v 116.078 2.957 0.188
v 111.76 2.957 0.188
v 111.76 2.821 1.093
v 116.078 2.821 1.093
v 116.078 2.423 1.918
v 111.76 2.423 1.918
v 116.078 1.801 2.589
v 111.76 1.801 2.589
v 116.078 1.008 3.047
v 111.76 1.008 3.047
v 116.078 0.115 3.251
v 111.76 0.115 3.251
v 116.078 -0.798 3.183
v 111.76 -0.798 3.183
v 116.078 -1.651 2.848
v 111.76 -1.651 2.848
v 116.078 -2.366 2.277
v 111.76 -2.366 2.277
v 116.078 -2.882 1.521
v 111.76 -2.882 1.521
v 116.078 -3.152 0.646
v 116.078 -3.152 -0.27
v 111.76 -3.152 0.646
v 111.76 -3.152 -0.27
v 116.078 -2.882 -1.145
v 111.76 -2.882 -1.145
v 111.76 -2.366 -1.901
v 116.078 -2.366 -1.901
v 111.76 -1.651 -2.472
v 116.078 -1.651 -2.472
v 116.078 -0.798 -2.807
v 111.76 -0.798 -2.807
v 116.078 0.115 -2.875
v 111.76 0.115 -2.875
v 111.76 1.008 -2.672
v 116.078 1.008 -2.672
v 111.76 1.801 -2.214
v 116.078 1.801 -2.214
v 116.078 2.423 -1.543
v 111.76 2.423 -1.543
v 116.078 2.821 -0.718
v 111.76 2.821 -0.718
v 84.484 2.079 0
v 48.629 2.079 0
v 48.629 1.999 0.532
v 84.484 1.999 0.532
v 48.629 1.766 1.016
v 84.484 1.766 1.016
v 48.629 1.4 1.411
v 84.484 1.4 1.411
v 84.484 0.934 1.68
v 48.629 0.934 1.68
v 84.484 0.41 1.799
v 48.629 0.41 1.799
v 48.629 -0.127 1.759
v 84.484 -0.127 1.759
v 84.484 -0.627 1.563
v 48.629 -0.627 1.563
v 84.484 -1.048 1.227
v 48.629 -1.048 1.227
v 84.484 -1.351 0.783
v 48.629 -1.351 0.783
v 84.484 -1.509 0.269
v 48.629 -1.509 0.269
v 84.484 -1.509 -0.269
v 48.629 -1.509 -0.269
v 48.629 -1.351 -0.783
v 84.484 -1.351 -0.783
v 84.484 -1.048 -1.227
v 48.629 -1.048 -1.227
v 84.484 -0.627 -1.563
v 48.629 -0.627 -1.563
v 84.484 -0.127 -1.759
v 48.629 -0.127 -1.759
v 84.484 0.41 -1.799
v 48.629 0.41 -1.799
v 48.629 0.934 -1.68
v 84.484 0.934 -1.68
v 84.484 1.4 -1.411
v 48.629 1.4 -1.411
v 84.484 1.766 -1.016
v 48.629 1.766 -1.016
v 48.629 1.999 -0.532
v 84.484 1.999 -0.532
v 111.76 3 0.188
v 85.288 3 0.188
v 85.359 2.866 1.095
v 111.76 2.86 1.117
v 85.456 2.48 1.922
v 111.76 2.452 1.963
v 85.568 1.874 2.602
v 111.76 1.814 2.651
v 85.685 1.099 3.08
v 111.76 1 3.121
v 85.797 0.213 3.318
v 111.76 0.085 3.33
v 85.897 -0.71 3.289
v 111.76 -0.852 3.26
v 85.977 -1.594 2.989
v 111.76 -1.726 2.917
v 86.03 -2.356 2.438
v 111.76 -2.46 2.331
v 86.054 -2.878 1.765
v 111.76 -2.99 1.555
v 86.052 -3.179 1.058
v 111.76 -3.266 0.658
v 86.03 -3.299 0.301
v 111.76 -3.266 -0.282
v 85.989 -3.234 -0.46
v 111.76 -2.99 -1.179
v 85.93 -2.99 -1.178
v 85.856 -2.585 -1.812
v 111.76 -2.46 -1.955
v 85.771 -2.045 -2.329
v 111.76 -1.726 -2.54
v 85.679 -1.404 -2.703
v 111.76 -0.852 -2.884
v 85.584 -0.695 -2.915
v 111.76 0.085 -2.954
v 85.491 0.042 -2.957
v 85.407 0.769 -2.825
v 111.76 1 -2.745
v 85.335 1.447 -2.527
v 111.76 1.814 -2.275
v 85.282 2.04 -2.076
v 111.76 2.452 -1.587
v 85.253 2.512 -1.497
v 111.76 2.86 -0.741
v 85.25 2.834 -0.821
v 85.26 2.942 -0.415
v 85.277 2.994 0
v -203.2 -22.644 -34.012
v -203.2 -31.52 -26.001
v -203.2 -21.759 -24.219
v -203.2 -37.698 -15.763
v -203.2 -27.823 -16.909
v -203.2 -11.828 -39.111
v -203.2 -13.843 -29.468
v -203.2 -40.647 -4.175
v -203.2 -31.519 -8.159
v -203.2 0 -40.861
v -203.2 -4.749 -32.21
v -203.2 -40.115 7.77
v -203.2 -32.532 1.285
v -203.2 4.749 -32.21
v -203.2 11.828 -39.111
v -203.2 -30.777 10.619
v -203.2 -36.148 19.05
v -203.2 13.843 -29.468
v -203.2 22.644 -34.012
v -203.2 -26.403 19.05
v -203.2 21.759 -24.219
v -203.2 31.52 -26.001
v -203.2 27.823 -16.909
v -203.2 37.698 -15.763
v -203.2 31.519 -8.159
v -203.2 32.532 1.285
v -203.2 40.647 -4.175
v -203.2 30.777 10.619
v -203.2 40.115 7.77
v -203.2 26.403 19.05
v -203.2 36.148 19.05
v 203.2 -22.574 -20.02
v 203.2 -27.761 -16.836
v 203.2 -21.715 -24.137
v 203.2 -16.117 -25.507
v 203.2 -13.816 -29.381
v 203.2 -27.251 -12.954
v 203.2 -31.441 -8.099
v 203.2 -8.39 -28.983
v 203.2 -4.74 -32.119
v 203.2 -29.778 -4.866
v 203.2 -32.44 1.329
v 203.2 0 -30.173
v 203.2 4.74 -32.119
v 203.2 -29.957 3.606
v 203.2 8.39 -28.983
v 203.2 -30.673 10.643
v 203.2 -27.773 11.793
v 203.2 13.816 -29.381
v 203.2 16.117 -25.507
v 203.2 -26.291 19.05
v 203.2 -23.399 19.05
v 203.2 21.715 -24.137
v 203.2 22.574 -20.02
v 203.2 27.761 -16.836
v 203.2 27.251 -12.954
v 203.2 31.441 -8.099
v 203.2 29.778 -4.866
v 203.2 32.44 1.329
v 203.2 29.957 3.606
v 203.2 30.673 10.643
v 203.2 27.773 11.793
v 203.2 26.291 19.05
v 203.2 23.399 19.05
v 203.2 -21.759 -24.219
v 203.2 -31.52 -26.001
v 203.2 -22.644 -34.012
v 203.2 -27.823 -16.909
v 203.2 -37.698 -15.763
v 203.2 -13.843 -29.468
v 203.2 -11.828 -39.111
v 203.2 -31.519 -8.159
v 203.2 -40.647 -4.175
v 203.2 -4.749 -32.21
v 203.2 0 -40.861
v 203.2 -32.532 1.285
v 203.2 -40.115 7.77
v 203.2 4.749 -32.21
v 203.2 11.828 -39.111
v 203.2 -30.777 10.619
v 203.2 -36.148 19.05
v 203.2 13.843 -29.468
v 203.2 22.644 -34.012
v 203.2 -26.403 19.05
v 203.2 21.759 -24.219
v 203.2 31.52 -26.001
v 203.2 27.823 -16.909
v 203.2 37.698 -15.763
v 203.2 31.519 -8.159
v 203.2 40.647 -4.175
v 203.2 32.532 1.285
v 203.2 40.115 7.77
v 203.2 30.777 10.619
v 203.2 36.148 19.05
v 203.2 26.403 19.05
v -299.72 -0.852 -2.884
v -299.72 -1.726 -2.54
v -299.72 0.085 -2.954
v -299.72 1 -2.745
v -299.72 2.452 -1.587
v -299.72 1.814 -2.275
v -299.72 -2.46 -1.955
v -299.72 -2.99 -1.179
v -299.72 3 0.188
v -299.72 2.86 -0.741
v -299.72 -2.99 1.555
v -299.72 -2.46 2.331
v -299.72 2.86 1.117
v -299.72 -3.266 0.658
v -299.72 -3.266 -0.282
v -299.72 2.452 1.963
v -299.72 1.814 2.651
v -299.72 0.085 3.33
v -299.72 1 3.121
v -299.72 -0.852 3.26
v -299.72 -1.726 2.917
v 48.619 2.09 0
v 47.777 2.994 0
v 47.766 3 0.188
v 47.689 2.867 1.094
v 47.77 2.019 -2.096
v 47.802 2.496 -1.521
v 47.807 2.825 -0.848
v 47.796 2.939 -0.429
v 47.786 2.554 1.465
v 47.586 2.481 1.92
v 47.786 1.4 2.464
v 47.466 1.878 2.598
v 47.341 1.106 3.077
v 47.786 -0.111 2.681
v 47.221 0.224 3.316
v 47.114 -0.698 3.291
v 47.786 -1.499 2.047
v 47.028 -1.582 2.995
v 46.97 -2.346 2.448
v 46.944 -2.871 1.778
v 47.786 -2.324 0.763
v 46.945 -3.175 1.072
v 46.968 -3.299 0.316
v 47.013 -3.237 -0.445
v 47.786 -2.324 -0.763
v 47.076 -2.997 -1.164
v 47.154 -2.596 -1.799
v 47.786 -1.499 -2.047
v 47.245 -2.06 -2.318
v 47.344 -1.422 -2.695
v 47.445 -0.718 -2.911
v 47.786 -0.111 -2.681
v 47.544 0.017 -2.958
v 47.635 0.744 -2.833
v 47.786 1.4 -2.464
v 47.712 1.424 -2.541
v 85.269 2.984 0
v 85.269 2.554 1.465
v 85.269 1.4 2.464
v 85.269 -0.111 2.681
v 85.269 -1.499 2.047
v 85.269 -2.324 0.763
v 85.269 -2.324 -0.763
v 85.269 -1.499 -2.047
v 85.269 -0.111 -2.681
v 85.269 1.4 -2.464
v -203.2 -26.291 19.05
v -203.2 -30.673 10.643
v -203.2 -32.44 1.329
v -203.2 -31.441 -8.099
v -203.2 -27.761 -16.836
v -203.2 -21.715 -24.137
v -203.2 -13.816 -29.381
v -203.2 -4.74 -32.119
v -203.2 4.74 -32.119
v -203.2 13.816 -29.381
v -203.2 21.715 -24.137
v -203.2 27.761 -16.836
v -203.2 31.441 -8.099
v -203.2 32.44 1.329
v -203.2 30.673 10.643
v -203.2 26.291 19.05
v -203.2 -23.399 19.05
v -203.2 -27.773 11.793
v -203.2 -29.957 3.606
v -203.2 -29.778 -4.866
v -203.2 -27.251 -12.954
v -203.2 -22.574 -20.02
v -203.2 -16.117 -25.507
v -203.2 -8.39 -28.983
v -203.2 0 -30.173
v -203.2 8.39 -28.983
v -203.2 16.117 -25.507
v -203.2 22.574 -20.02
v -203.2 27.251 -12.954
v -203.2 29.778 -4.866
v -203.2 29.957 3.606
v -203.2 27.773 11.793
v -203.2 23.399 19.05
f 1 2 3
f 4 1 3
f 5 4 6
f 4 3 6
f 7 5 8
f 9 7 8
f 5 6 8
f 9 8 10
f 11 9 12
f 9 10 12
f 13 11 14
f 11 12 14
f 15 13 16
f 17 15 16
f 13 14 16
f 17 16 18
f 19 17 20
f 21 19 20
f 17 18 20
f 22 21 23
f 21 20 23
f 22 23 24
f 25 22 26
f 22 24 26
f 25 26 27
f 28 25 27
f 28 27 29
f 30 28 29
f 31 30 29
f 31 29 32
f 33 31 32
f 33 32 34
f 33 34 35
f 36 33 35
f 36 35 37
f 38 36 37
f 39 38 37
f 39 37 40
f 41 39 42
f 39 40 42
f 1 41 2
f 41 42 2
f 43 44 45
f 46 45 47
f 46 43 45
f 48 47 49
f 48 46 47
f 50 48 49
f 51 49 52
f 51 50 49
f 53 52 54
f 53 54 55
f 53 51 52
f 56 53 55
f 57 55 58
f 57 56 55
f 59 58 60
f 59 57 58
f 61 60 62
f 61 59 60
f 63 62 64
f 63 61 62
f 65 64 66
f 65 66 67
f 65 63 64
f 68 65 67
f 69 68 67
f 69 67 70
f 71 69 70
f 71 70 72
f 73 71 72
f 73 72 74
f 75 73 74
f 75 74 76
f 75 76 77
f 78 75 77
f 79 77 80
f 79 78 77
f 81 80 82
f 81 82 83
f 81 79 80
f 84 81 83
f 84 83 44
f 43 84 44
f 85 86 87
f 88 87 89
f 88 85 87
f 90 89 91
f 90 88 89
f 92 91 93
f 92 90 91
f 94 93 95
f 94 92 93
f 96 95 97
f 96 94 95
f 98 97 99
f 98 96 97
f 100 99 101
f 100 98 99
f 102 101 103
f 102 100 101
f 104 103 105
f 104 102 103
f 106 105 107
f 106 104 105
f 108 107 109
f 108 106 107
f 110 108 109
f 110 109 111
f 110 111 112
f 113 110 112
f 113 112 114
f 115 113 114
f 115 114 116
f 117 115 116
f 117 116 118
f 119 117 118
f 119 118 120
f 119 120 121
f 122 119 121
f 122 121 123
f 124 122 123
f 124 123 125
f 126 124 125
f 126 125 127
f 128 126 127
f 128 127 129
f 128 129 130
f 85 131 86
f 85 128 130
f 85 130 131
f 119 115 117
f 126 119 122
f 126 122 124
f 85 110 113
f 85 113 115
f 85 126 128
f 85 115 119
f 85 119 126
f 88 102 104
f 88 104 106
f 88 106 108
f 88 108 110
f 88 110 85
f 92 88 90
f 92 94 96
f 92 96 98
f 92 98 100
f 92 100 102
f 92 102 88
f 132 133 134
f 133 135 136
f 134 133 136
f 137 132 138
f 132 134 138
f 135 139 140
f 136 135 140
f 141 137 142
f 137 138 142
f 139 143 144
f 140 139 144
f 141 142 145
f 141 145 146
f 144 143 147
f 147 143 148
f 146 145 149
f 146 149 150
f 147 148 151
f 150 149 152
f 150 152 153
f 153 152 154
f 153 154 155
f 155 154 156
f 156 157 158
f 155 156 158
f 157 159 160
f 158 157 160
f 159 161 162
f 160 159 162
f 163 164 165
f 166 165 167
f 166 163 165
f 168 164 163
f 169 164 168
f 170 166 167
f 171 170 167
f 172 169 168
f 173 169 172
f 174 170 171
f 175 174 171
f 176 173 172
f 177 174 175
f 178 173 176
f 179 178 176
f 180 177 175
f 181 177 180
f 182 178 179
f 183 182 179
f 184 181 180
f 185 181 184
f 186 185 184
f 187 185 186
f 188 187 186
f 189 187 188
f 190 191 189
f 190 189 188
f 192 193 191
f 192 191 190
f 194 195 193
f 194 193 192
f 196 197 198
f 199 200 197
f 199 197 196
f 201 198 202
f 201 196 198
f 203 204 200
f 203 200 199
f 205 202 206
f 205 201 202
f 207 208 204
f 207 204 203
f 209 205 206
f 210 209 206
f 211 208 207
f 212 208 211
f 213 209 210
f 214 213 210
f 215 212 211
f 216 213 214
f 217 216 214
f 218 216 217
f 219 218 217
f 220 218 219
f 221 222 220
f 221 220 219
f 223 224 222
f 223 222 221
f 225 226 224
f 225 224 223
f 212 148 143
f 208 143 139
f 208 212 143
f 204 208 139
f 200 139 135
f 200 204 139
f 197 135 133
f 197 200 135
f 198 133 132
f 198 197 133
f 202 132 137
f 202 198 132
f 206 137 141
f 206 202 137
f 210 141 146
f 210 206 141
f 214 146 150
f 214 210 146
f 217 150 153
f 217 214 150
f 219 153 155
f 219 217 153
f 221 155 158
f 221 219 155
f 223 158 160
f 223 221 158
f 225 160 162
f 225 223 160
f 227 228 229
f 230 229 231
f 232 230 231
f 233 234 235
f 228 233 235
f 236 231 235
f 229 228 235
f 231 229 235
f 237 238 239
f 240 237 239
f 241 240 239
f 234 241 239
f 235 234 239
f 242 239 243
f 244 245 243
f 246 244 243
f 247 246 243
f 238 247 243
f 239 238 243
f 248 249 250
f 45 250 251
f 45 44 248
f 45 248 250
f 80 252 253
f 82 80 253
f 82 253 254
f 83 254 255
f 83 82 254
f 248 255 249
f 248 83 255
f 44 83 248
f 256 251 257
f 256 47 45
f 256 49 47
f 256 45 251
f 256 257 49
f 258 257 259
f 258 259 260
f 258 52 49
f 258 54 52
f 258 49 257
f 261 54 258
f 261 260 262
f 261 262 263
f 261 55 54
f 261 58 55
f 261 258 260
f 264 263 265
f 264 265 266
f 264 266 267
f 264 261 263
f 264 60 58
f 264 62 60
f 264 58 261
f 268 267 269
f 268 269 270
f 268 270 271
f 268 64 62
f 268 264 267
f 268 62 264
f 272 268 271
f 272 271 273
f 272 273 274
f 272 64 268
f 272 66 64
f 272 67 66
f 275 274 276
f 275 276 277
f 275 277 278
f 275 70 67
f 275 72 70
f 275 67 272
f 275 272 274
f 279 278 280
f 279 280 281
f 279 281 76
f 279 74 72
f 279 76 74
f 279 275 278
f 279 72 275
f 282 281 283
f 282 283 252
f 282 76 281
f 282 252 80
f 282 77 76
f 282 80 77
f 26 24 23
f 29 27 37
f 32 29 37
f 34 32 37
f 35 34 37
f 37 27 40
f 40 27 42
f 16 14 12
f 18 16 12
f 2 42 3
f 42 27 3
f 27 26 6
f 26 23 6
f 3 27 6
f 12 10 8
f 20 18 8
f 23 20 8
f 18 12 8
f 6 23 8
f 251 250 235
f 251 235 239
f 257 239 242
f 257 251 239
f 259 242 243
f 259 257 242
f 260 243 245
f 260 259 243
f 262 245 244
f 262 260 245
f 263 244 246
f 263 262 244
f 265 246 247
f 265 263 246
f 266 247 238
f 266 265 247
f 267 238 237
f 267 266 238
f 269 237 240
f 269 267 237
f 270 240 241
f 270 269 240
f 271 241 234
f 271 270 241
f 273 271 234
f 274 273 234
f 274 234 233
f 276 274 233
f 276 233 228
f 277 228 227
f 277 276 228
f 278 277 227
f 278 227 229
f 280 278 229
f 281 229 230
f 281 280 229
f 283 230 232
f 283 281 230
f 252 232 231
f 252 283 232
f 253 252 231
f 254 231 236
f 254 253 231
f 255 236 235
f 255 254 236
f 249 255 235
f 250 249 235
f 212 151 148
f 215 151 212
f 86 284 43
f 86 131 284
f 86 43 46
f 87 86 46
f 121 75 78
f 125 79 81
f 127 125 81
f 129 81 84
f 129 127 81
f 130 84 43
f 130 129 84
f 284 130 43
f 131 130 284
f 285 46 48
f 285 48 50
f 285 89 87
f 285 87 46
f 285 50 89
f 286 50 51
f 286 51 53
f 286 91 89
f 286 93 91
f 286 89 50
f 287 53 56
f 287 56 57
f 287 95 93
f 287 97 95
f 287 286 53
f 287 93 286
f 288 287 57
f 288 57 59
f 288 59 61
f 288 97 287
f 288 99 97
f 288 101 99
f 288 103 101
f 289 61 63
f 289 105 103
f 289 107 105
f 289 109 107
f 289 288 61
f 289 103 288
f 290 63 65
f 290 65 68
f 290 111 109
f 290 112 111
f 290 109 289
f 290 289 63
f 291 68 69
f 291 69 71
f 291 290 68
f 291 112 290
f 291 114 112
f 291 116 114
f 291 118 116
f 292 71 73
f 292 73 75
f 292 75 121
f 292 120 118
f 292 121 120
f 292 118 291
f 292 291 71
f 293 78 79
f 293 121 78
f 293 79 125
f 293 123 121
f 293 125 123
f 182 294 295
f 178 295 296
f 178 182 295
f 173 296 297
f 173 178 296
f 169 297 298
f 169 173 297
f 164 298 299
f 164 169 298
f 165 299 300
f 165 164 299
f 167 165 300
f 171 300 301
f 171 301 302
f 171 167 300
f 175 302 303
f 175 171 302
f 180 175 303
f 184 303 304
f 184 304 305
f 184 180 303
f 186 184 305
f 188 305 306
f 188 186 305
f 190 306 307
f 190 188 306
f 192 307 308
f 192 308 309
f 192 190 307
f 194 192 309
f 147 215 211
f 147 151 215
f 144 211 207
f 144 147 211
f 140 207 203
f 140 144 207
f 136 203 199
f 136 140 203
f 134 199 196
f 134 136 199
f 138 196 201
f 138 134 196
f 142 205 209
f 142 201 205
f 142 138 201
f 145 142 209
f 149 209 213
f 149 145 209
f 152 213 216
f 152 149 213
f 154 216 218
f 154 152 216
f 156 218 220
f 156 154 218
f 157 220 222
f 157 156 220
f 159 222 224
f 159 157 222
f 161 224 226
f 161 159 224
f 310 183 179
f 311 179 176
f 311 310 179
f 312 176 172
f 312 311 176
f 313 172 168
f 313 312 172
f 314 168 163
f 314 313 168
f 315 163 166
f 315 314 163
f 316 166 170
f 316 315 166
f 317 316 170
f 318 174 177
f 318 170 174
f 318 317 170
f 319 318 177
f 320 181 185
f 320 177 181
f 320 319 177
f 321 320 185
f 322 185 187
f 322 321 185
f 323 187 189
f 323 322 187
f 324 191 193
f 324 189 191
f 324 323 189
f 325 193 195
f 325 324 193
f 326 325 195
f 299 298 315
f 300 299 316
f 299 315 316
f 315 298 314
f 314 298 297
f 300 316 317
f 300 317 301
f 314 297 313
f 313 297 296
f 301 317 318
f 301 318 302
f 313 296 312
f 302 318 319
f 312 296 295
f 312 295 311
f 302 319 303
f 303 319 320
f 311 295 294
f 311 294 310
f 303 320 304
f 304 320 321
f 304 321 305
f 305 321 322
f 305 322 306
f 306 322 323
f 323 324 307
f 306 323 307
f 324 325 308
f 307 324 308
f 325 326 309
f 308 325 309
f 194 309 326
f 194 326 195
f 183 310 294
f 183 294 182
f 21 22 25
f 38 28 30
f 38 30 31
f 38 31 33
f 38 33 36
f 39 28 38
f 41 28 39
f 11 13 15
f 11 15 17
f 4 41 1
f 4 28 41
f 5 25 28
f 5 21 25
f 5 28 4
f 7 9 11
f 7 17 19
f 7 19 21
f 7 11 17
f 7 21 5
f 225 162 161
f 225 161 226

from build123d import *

# Parameters (mm, degrees)
F0_R          = 32.467339
F0_R_2        = 30.172731
F1_DEPTH      = 203.2
F1_DEPTH_BACK = 203.2
F2_R          = 40.860562
F2_R_2        = 32.557761
F3_DEPTH      = 203.2
F3_DEPTH_BACK = 203.2
F4_R          = 3.150683
F5_DEPTH      = 111.76
F5_DEPTH_BACK = 299.72
F10_R         = 3.071737
F11_DEPTH     = 4.318
F13_W         = 426.029071
F13_H         = 92.935704
F14_DEPTH     = 35.814


with BuildPart() as f1:
    # F0 (on Right) → F1 (new body, two sides)
    with BuildSketch(Plane.YZ) as f1_sk:
        Circle(F0_R)
        Circle(F0_R_2, mode=Mode.SUBTRACT)
    extrude(amount=F1_DEPTH)
    extrude(f1_sk.sketch, amount=-F1_DEPTH_BACK)


with BuildPart() as f3:
    # F2 (on Right) → F3 (new body, two sides)
    with BuildSketch(Plane.YZ) as f3_sk:
        Circle(F2_R)
        Circle(F2_R_2, mode=Mode.SUBTRACT)
    extrude(amount=F3_DEPTH)
    extrude(f3_sk.sketch, amount=-F3_DEPTH_BACK)


with BuildPart() as f5:
    # F4 (on Right) → F5 (new body, two sides)
    with BuildSketch(Plane.YZ) as f5_sk:
        with Locations((-0.150834, 0.188072)):
            Circle(F4_R)
    extrude(amount=F5_DEPTH)
    extrude(f5_sk.sketch, amount=-F5_DEPTH_BACK)

    # F6 (on Top) → F8 (revolve, cut)
    with BuildSketch(Plane.XY):
        Polygon((46.162983, 4.727822), (48.628672, 2.079207), (84.48353, 2.079207), (86.781593, 4.727822), align=None)
    revolve(axis=Axis((28.044745, 0.274948, 0), (1, 0, 0)), mode=Mode.SUBTRACT)


with BuildPart() as f11:
    # F10 (on offset) → F11 (new body)
    with BuildSketch(Plane.YZ.offset(111.76)):
        with Locations((-0.114645, 0.187832)):
            Circle(F10_R)
    extrude(amount=F11_DEPTH)


with BuildPart() as f14_tool:
    # F13 (on offset) → F14 (new body)
    with BuildSketch(Plane.XY.offset(19.05)):
        with Locations((-1.902603, -0.868738)):
            Rectangle(F13_W, F13_H)
    extrude(amount=F14_DEPTH)


with BuildPart() as f1_1:
    add(f1.part)

    # F14: cut by f14_tool
    add(f14_tool.part, mode=Mode.SUBTRACT)


with BuildPart() as f3_1:
    add(f3.part)

    # F14: cut by f14_tool
    add(f14_tool.part, mode=Mode.SUBTRACT)


solid = Compound([f5.part, f11.part, f1_1.part, f3_1.part])
